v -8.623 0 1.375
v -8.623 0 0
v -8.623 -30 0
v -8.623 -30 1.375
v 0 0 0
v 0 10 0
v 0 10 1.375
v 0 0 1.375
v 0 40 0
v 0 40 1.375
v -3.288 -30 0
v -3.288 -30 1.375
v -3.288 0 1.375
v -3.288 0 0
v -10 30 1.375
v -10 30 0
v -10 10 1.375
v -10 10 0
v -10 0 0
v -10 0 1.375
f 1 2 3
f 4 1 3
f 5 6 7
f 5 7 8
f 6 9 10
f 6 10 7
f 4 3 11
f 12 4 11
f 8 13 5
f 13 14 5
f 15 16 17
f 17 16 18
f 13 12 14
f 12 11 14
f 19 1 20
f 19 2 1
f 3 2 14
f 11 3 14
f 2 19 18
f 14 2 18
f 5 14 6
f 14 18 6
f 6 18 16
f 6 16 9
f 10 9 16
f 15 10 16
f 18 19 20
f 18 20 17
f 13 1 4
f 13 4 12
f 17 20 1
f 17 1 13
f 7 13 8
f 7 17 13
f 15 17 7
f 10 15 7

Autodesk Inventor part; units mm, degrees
ref_plane "YZ Plane" through (0, 0, 0) normal (1, 0, 0) x (0, 1, 0)
ref_plane "XZ Plane" through (0, 0, 0) normal (0, 1, 0) x (-1, 0, 0)
ref_plane "XY Plane" through (0, 0, 0) normal (0, 0, 1) x (1, 0, 0)
sketch "Sketch1" plane through (0, 0, 0) normal (0, 0, 1) x (1, 0, 0)
  line L0 (-10, 0) -> (-10, 10)
  line L1 (0, 10) -> (0, 0)
  line L2 (-8.623, 0) -> (-8.623, -30)
  line L3 (-8.623, -30) -> (-3.288, -30)
  line L4 (-3.288, -30) -> (-3.288, 0)
  line L5 (0, 40) -> (-10, 30)
  line L6 (0, 40) -> (14.1421, 40) construction
  line L7 (-10, 30) -> (-10, 10)
  line L8 (-3.288, 0) -> (0, 0)
  line L9 (-8.623, 0) -> (-10, 0)
  line L10 (0, 40) -> (0, 10)
  dimension "d0" = 10
  dimension "d1" = 10
  dimension "d2" = 5.335
  dimension "d3" = 30
  dimension "d4" = 3.288
  dimension "d5" = 1.377
  dimension "d7" = 135
extrude "Extrusion1" add sketch "Sketch1" along normal blind 1.375
properties part number "bladex1"
